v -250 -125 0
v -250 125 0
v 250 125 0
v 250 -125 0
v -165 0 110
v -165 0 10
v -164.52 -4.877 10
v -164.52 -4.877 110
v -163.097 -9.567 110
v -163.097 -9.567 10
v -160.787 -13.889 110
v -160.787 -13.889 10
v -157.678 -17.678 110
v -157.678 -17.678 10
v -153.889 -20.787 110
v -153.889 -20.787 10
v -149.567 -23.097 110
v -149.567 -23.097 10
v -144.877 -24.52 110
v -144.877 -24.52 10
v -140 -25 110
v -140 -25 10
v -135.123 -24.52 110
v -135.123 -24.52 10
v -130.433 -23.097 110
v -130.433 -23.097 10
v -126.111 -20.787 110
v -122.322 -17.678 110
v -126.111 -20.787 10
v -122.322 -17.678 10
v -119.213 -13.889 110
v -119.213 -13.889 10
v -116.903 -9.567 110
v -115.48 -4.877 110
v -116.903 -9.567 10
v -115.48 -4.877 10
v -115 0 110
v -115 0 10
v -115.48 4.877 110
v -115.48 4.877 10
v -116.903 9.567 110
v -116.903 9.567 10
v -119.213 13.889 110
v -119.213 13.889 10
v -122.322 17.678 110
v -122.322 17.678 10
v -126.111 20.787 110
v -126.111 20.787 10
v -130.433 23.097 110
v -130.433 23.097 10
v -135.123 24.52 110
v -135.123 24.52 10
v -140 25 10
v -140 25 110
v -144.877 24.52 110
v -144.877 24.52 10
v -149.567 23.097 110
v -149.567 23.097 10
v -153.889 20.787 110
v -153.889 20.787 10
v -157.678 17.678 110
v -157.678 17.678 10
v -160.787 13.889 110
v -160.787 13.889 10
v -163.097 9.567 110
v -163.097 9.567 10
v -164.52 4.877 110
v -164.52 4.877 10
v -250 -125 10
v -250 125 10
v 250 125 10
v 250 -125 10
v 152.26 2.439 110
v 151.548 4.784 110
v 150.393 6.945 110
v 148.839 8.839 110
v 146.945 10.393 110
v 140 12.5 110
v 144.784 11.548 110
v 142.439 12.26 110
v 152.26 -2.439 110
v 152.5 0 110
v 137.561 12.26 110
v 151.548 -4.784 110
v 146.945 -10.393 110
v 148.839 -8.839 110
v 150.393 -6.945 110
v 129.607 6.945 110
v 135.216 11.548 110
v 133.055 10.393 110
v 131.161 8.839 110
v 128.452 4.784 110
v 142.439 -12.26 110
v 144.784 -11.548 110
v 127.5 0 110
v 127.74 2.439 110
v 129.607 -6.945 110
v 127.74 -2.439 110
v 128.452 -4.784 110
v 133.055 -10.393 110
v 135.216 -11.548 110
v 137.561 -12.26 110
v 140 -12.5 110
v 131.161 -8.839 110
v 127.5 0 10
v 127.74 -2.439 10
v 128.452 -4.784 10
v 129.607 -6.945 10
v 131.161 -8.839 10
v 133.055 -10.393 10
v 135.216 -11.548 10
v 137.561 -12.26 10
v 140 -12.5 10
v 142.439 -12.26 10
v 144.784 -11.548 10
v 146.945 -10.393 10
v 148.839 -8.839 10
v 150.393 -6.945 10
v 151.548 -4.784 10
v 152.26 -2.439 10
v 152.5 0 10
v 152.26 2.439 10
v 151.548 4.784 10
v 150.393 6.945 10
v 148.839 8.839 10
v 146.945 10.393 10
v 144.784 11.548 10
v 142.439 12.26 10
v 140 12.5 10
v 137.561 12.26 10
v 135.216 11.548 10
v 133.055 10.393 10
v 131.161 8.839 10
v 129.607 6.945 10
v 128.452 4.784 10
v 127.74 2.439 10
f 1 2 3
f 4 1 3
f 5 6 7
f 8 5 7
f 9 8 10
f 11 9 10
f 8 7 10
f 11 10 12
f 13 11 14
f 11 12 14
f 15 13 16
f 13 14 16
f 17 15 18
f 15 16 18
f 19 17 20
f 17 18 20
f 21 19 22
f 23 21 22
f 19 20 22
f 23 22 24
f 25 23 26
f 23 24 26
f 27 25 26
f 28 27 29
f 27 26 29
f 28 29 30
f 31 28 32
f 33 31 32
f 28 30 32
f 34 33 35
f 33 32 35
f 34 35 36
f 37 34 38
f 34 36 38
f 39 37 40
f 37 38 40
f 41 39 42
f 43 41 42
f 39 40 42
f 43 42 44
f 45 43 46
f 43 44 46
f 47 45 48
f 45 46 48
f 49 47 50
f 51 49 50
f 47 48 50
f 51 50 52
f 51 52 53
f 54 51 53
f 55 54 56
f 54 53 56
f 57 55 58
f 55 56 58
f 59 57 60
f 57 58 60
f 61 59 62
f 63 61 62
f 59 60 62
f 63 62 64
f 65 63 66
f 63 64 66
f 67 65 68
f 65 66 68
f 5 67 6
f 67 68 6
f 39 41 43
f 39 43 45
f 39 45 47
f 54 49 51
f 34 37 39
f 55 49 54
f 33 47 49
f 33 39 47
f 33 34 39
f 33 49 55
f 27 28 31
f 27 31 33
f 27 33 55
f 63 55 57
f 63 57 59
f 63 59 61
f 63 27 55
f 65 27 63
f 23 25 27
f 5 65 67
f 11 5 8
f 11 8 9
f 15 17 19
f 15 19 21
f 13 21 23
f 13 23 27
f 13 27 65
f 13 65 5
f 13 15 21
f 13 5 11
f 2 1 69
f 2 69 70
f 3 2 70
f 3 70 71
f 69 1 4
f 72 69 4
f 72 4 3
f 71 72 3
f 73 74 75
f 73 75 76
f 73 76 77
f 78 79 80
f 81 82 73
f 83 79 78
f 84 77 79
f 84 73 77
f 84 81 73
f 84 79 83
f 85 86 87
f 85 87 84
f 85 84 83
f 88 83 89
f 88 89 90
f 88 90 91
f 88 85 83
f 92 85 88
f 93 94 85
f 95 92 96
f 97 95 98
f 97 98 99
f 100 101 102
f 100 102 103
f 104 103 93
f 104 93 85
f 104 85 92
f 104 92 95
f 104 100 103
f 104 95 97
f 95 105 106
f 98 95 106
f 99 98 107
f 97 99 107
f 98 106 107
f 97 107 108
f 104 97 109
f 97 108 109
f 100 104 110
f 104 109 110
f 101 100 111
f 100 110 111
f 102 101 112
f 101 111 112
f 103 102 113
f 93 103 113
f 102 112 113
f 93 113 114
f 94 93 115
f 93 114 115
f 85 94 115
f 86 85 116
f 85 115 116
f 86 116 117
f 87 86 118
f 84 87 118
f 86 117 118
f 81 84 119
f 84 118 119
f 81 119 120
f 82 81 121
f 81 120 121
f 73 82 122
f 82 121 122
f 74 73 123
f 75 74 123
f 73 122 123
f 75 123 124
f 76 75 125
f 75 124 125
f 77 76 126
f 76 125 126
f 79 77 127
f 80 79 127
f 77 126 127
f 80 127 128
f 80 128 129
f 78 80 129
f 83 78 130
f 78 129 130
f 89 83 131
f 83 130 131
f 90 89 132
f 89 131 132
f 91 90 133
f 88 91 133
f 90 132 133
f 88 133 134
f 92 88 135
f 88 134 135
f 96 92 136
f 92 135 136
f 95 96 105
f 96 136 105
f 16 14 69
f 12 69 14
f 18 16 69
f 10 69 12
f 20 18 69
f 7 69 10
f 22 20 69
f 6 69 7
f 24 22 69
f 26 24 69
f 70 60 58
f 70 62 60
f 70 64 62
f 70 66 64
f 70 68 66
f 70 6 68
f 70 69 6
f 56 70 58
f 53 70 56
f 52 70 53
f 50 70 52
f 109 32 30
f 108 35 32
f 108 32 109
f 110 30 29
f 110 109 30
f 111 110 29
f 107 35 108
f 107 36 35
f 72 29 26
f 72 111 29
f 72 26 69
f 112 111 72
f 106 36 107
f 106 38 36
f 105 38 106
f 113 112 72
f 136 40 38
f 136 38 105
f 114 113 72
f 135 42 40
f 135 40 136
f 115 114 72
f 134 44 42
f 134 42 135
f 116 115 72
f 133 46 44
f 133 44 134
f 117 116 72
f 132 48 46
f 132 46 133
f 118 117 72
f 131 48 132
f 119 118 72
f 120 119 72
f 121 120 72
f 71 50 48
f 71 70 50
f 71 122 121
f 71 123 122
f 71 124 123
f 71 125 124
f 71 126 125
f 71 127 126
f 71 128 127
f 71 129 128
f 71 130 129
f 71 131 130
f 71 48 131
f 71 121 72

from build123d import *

# Parameters (mm, degrees)
SKETCH1_W           = 500
SKETCH1_H           = 250
BOSS_EXTRUDE1_DEPTH = 10
SKETCH2_R           = 25
SKETCH2_R_2         = 12.5
BOSS_EXTRUDE2_DEPTH = 100


with BuildPart() as part:
    # Sketch1 → Boss-Extrude1 (new body)
    with BuildSketch(Plane.XY):
        Rectangle(SKETCH1_W, SKETCH1_H)
    extrude(amount=BOSS_EXTRUDE1_DEPTH)

    # Sketch2 → Boss-Extrude2 (add)
    with BuildSketch(Plane.XY.offset(10)):
        with Locations(Location((-140, 0, 0), (0, 0, 180))):
            Circle(SKETCH2_R)
        with Locations(Location((140, 0, 0), (0, 0, 180))):
            Circle(SKETCH2_R_2)
    extrude(amount=BOSS_EXTRUDE2_DEPTH)


solid = part.part
